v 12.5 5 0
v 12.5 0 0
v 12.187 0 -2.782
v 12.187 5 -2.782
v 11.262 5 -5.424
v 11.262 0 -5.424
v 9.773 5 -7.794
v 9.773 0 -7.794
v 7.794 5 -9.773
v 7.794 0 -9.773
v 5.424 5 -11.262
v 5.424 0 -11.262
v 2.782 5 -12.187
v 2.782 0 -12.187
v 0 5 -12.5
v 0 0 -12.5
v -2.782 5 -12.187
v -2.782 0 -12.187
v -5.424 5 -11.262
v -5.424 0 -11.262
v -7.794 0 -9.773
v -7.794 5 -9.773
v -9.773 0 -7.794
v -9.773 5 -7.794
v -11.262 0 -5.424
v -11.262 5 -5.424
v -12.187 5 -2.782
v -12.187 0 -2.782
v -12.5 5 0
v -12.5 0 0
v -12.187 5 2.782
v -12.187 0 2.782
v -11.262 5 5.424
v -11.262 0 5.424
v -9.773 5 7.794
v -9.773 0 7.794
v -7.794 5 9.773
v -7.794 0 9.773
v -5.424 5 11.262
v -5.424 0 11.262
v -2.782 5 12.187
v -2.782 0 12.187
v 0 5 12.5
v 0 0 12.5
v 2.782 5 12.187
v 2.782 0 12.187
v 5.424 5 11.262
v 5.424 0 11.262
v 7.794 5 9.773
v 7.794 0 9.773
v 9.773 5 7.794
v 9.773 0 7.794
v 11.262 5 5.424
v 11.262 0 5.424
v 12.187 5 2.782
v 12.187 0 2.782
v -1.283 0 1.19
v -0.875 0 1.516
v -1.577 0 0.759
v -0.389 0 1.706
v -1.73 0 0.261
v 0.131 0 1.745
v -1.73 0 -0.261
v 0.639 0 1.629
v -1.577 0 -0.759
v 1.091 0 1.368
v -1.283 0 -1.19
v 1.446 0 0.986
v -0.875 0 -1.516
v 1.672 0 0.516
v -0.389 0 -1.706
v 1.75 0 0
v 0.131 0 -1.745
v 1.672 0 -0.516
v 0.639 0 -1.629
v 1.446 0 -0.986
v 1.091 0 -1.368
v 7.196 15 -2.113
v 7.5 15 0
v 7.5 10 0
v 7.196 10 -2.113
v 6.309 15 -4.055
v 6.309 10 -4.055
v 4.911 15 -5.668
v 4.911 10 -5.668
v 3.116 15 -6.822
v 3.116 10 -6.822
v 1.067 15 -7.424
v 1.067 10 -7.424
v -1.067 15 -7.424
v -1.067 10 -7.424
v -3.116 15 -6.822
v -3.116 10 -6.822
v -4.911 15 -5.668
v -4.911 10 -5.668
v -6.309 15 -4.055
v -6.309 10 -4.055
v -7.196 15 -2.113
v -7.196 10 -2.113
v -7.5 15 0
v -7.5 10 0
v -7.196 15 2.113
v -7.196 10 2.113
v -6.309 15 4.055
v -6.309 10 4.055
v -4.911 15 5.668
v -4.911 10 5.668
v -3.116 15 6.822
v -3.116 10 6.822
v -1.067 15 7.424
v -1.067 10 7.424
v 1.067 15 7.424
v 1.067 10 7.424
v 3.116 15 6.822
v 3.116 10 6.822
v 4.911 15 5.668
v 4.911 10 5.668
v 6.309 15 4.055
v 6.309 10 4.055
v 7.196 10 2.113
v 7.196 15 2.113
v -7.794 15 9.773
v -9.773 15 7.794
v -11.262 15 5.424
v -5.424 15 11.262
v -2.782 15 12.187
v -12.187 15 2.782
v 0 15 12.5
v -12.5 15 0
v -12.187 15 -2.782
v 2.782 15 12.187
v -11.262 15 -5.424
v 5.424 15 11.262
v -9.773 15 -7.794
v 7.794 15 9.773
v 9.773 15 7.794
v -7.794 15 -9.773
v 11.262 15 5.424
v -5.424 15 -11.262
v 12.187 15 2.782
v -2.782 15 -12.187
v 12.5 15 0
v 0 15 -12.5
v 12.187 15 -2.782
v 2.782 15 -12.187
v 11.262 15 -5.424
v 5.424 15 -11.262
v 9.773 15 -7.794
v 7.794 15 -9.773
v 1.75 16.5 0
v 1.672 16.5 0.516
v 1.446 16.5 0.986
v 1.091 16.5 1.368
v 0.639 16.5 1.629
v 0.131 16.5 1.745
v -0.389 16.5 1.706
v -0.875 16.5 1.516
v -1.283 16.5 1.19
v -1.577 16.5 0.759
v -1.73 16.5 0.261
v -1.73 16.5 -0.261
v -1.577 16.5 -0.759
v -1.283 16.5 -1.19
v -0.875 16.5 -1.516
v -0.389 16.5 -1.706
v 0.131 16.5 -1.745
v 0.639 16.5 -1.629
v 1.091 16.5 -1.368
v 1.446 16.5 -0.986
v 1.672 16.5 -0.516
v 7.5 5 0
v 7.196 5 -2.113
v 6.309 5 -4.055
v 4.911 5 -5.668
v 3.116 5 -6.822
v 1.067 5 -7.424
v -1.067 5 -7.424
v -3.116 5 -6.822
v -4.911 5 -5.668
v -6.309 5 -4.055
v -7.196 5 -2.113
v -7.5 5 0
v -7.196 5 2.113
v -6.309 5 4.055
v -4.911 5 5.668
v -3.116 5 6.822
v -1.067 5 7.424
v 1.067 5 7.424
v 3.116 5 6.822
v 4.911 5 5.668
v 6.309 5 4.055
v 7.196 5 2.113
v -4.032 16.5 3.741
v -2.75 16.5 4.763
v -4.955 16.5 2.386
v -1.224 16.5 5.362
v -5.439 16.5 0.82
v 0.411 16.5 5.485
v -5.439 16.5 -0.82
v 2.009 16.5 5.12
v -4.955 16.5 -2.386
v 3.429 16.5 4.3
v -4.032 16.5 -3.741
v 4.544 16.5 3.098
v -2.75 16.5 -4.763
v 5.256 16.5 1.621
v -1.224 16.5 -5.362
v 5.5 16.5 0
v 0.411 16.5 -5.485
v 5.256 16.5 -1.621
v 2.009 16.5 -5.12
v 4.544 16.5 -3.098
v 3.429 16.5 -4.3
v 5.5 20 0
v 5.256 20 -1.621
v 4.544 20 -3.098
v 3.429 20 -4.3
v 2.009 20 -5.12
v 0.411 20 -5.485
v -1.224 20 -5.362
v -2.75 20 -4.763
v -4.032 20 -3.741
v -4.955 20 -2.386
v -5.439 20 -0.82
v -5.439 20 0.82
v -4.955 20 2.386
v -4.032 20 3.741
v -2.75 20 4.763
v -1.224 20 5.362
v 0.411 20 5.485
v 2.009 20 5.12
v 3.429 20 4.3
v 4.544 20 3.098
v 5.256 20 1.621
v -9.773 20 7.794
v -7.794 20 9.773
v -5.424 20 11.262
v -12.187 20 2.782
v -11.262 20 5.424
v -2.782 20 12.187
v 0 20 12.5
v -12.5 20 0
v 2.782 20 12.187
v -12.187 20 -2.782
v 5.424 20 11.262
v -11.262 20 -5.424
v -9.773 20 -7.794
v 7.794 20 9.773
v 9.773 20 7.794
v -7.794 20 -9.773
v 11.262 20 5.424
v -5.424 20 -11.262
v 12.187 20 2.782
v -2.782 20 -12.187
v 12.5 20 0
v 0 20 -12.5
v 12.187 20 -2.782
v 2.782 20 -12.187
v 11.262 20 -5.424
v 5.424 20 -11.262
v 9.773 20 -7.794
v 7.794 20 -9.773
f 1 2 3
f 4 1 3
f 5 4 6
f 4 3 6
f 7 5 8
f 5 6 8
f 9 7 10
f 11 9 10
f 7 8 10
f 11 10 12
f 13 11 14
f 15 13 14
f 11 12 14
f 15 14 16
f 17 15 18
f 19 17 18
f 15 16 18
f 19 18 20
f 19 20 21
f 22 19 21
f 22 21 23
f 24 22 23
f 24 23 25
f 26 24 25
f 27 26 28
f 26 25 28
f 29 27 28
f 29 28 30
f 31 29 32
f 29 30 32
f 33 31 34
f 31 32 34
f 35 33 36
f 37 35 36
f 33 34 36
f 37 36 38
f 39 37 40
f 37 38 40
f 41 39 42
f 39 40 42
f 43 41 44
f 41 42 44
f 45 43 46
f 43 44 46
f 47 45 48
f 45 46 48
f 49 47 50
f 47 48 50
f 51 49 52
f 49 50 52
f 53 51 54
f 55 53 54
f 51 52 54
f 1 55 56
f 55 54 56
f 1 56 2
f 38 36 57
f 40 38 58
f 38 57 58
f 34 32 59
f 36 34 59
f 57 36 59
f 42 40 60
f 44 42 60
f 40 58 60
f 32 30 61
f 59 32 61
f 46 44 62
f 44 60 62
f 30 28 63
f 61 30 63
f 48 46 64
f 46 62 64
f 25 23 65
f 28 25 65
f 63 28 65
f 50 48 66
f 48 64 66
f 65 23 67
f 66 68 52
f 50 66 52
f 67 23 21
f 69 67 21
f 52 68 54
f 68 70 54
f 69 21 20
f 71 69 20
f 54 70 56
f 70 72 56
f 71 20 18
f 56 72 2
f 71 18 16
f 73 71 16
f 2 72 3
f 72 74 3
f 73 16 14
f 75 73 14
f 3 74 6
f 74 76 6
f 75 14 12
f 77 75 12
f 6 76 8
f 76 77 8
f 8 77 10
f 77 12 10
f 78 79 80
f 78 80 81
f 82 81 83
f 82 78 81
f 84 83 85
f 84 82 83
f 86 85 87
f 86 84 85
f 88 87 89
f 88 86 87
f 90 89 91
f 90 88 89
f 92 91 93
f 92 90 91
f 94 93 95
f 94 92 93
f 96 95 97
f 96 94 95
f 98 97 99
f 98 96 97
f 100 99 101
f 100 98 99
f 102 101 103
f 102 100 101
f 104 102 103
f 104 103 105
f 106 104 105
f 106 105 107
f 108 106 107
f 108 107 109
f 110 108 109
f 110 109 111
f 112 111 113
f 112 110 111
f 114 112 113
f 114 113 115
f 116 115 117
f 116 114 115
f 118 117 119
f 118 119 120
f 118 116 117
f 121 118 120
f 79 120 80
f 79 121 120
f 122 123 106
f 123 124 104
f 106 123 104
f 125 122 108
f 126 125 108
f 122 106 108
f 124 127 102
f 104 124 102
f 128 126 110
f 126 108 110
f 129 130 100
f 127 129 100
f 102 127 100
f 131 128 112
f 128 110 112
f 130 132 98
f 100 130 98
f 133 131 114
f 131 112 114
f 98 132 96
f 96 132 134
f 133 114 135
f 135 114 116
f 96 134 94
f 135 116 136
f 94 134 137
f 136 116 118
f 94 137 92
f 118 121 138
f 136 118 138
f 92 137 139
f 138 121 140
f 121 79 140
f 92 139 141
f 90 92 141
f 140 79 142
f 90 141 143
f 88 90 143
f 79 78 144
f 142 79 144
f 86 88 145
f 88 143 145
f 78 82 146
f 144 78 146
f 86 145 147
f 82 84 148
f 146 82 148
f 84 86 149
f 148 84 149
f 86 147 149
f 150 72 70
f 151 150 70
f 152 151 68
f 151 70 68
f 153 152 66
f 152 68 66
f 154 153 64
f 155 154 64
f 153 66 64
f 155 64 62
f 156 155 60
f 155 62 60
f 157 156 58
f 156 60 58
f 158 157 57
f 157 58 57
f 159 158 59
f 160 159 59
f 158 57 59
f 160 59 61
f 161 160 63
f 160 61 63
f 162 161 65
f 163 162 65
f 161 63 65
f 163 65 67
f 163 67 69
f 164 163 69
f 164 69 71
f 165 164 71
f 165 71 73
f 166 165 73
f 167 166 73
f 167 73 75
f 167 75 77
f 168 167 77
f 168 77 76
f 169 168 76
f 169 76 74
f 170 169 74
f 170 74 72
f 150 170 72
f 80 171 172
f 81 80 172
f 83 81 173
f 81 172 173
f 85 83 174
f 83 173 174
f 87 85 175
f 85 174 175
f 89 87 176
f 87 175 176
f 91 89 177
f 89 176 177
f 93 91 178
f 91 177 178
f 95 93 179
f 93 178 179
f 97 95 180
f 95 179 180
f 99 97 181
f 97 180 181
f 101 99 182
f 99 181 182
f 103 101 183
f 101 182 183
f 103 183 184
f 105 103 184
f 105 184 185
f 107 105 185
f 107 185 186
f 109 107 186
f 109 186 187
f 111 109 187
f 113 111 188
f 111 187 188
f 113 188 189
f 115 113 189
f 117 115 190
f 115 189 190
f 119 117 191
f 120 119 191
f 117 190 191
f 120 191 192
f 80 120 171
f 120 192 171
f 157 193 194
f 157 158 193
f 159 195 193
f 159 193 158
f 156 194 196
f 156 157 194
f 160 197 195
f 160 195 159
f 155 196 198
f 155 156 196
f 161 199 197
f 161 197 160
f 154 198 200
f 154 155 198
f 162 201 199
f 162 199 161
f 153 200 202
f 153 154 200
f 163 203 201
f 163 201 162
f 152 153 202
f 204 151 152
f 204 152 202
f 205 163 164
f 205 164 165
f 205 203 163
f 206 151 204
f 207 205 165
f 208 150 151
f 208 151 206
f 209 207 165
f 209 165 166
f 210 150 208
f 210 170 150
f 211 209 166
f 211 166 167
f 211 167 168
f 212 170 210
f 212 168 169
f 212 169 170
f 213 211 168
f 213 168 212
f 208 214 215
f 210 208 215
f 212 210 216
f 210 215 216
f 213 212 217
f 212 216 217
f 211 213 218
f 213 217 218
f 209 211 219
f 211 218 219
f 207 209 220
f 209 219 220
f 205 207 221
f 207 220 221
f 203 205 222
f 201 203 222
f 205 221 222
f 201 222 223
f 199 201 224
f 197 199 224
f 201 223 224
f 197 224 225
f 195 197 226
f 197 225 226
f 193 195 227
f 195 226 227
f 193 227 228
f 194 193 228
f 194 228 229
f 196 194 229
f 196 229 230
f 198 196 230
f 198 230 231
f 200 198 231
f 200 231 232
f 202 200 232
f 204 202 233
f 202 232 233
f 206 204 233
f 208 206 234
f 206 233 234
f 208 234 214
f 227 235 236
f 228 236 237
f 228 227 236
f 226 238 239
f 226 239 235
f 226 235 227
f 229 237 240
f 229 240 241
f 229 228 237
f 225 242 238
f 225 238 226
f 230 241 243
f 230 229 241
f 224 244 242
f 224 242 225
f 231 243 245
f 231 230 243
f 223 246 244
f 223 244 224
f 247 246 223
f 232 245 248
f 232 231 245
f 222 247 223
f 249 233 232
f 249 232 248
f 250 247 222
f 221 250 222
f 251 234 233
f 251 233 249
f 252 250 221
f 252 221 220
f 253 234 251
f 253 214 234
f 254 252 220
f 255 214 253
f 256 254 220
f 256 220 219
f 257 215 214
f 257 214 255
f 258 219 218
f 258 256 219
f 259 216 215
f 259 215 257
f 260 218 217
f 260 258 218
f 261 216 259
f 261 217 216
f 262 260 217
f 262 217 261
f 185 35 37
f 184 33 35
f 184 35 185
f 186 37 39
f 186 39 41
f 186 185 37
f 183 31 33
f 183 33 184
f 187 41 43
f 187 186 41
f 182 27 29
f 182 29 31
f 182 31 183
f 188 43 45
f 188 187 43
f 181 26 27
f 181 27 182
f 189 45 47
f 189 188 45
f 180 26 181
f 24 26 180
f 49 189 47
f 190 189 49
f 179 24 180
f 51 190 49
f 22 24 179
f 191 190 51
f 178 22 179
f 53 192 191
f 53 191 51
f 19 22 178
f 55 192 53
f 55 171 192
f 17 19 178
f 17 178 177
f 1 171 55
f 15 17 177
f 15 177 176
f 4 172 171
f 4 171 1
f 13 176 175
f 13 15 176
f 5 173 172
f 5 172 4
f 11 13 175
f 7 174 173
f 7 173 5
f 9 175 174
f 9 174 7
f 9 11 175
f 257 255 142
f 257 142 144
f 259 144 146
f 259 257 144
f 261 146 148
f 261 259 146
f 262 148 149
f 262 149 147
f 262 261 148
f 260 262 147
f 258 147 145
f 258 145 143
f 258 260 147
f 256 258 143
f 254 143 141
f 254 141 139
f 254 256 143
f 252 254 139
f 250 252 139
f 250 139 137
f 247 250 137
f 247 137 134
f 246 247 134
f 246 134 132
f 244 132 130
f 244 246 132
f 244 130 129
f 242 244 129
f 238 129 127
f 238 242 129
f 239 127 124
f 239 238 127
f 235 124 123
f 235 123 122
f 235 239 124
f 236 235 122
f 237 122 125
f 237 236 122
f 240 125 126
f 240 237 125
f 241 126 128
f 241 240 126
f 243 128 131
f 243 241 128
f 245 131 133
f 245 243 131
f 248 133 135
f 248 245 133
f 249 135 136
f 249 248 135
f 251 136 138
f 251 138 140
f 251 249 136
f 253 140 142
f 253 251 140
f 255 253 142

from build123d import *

# Parameters (mm, degrees)
SKETCH1_R           = 12.5
BOSS_EXTRUDE1_DEPTH = 5
SKETCH2_R           = 7.5
BOSS_EXTRUDE2_DEPTH = 5
SKETCH3_R           = 5.5
CUT_EXTRUDE1_DEPTH  = 3.5
SKETCH6_R           = 1.75
CUT_EXTRUDE2_DEPTH  = 21


with BuildPart() as part:
    # Sketch1 → Boss-Extrude1 (new body)
    with BuildSketch(Plane(origin=(0, 0, 0), x_dir=(1, 0, 0), z_dir=(0, 1, 0))):
        Circle(SKETCH1_R)
    extrude(amount=BOSS_EXTRUDE1_DEPTH)

    # Sketch2 → Boss-Extrude2 (add)
    with BuildSketch(Plane(origin=(0, 5, 0), x_dir=(1, 0, 0), z_dir=(0, 1, 0))):
        Circle(SKETCH2_R)
    extrude(amount=BOSS_EXTRUDE2_DEPTH)

    # Mirror6: part across plane


with BuildPart() as part_1:
    add(part.part)
    add(part.part.mirror(Plane.ZX.offset(10)))

    # Sketch3 → Cut-Extrude1 (cut)
    with BuildSketch(Plane(origin=(0, 20, 0), x_dir=(1, 0, 0), z_dir=(0, 1, 0))):
        Circle(SKETCH3_R)
    extrude(amount=-CUT_EXTRUDE1_DEPTH, mode=Mode.SUBTRACT)

    # Sketch6 → Cut-Extrude2 (cut, through all)
    with BuildSketch(Plane.XZ):
        Circle(SKETCH6_R)
    extrude(amount=-CUT_EXTRUDE2_DEPTH, mode=Mode.SUBTRACT)


solid = part_1.part
